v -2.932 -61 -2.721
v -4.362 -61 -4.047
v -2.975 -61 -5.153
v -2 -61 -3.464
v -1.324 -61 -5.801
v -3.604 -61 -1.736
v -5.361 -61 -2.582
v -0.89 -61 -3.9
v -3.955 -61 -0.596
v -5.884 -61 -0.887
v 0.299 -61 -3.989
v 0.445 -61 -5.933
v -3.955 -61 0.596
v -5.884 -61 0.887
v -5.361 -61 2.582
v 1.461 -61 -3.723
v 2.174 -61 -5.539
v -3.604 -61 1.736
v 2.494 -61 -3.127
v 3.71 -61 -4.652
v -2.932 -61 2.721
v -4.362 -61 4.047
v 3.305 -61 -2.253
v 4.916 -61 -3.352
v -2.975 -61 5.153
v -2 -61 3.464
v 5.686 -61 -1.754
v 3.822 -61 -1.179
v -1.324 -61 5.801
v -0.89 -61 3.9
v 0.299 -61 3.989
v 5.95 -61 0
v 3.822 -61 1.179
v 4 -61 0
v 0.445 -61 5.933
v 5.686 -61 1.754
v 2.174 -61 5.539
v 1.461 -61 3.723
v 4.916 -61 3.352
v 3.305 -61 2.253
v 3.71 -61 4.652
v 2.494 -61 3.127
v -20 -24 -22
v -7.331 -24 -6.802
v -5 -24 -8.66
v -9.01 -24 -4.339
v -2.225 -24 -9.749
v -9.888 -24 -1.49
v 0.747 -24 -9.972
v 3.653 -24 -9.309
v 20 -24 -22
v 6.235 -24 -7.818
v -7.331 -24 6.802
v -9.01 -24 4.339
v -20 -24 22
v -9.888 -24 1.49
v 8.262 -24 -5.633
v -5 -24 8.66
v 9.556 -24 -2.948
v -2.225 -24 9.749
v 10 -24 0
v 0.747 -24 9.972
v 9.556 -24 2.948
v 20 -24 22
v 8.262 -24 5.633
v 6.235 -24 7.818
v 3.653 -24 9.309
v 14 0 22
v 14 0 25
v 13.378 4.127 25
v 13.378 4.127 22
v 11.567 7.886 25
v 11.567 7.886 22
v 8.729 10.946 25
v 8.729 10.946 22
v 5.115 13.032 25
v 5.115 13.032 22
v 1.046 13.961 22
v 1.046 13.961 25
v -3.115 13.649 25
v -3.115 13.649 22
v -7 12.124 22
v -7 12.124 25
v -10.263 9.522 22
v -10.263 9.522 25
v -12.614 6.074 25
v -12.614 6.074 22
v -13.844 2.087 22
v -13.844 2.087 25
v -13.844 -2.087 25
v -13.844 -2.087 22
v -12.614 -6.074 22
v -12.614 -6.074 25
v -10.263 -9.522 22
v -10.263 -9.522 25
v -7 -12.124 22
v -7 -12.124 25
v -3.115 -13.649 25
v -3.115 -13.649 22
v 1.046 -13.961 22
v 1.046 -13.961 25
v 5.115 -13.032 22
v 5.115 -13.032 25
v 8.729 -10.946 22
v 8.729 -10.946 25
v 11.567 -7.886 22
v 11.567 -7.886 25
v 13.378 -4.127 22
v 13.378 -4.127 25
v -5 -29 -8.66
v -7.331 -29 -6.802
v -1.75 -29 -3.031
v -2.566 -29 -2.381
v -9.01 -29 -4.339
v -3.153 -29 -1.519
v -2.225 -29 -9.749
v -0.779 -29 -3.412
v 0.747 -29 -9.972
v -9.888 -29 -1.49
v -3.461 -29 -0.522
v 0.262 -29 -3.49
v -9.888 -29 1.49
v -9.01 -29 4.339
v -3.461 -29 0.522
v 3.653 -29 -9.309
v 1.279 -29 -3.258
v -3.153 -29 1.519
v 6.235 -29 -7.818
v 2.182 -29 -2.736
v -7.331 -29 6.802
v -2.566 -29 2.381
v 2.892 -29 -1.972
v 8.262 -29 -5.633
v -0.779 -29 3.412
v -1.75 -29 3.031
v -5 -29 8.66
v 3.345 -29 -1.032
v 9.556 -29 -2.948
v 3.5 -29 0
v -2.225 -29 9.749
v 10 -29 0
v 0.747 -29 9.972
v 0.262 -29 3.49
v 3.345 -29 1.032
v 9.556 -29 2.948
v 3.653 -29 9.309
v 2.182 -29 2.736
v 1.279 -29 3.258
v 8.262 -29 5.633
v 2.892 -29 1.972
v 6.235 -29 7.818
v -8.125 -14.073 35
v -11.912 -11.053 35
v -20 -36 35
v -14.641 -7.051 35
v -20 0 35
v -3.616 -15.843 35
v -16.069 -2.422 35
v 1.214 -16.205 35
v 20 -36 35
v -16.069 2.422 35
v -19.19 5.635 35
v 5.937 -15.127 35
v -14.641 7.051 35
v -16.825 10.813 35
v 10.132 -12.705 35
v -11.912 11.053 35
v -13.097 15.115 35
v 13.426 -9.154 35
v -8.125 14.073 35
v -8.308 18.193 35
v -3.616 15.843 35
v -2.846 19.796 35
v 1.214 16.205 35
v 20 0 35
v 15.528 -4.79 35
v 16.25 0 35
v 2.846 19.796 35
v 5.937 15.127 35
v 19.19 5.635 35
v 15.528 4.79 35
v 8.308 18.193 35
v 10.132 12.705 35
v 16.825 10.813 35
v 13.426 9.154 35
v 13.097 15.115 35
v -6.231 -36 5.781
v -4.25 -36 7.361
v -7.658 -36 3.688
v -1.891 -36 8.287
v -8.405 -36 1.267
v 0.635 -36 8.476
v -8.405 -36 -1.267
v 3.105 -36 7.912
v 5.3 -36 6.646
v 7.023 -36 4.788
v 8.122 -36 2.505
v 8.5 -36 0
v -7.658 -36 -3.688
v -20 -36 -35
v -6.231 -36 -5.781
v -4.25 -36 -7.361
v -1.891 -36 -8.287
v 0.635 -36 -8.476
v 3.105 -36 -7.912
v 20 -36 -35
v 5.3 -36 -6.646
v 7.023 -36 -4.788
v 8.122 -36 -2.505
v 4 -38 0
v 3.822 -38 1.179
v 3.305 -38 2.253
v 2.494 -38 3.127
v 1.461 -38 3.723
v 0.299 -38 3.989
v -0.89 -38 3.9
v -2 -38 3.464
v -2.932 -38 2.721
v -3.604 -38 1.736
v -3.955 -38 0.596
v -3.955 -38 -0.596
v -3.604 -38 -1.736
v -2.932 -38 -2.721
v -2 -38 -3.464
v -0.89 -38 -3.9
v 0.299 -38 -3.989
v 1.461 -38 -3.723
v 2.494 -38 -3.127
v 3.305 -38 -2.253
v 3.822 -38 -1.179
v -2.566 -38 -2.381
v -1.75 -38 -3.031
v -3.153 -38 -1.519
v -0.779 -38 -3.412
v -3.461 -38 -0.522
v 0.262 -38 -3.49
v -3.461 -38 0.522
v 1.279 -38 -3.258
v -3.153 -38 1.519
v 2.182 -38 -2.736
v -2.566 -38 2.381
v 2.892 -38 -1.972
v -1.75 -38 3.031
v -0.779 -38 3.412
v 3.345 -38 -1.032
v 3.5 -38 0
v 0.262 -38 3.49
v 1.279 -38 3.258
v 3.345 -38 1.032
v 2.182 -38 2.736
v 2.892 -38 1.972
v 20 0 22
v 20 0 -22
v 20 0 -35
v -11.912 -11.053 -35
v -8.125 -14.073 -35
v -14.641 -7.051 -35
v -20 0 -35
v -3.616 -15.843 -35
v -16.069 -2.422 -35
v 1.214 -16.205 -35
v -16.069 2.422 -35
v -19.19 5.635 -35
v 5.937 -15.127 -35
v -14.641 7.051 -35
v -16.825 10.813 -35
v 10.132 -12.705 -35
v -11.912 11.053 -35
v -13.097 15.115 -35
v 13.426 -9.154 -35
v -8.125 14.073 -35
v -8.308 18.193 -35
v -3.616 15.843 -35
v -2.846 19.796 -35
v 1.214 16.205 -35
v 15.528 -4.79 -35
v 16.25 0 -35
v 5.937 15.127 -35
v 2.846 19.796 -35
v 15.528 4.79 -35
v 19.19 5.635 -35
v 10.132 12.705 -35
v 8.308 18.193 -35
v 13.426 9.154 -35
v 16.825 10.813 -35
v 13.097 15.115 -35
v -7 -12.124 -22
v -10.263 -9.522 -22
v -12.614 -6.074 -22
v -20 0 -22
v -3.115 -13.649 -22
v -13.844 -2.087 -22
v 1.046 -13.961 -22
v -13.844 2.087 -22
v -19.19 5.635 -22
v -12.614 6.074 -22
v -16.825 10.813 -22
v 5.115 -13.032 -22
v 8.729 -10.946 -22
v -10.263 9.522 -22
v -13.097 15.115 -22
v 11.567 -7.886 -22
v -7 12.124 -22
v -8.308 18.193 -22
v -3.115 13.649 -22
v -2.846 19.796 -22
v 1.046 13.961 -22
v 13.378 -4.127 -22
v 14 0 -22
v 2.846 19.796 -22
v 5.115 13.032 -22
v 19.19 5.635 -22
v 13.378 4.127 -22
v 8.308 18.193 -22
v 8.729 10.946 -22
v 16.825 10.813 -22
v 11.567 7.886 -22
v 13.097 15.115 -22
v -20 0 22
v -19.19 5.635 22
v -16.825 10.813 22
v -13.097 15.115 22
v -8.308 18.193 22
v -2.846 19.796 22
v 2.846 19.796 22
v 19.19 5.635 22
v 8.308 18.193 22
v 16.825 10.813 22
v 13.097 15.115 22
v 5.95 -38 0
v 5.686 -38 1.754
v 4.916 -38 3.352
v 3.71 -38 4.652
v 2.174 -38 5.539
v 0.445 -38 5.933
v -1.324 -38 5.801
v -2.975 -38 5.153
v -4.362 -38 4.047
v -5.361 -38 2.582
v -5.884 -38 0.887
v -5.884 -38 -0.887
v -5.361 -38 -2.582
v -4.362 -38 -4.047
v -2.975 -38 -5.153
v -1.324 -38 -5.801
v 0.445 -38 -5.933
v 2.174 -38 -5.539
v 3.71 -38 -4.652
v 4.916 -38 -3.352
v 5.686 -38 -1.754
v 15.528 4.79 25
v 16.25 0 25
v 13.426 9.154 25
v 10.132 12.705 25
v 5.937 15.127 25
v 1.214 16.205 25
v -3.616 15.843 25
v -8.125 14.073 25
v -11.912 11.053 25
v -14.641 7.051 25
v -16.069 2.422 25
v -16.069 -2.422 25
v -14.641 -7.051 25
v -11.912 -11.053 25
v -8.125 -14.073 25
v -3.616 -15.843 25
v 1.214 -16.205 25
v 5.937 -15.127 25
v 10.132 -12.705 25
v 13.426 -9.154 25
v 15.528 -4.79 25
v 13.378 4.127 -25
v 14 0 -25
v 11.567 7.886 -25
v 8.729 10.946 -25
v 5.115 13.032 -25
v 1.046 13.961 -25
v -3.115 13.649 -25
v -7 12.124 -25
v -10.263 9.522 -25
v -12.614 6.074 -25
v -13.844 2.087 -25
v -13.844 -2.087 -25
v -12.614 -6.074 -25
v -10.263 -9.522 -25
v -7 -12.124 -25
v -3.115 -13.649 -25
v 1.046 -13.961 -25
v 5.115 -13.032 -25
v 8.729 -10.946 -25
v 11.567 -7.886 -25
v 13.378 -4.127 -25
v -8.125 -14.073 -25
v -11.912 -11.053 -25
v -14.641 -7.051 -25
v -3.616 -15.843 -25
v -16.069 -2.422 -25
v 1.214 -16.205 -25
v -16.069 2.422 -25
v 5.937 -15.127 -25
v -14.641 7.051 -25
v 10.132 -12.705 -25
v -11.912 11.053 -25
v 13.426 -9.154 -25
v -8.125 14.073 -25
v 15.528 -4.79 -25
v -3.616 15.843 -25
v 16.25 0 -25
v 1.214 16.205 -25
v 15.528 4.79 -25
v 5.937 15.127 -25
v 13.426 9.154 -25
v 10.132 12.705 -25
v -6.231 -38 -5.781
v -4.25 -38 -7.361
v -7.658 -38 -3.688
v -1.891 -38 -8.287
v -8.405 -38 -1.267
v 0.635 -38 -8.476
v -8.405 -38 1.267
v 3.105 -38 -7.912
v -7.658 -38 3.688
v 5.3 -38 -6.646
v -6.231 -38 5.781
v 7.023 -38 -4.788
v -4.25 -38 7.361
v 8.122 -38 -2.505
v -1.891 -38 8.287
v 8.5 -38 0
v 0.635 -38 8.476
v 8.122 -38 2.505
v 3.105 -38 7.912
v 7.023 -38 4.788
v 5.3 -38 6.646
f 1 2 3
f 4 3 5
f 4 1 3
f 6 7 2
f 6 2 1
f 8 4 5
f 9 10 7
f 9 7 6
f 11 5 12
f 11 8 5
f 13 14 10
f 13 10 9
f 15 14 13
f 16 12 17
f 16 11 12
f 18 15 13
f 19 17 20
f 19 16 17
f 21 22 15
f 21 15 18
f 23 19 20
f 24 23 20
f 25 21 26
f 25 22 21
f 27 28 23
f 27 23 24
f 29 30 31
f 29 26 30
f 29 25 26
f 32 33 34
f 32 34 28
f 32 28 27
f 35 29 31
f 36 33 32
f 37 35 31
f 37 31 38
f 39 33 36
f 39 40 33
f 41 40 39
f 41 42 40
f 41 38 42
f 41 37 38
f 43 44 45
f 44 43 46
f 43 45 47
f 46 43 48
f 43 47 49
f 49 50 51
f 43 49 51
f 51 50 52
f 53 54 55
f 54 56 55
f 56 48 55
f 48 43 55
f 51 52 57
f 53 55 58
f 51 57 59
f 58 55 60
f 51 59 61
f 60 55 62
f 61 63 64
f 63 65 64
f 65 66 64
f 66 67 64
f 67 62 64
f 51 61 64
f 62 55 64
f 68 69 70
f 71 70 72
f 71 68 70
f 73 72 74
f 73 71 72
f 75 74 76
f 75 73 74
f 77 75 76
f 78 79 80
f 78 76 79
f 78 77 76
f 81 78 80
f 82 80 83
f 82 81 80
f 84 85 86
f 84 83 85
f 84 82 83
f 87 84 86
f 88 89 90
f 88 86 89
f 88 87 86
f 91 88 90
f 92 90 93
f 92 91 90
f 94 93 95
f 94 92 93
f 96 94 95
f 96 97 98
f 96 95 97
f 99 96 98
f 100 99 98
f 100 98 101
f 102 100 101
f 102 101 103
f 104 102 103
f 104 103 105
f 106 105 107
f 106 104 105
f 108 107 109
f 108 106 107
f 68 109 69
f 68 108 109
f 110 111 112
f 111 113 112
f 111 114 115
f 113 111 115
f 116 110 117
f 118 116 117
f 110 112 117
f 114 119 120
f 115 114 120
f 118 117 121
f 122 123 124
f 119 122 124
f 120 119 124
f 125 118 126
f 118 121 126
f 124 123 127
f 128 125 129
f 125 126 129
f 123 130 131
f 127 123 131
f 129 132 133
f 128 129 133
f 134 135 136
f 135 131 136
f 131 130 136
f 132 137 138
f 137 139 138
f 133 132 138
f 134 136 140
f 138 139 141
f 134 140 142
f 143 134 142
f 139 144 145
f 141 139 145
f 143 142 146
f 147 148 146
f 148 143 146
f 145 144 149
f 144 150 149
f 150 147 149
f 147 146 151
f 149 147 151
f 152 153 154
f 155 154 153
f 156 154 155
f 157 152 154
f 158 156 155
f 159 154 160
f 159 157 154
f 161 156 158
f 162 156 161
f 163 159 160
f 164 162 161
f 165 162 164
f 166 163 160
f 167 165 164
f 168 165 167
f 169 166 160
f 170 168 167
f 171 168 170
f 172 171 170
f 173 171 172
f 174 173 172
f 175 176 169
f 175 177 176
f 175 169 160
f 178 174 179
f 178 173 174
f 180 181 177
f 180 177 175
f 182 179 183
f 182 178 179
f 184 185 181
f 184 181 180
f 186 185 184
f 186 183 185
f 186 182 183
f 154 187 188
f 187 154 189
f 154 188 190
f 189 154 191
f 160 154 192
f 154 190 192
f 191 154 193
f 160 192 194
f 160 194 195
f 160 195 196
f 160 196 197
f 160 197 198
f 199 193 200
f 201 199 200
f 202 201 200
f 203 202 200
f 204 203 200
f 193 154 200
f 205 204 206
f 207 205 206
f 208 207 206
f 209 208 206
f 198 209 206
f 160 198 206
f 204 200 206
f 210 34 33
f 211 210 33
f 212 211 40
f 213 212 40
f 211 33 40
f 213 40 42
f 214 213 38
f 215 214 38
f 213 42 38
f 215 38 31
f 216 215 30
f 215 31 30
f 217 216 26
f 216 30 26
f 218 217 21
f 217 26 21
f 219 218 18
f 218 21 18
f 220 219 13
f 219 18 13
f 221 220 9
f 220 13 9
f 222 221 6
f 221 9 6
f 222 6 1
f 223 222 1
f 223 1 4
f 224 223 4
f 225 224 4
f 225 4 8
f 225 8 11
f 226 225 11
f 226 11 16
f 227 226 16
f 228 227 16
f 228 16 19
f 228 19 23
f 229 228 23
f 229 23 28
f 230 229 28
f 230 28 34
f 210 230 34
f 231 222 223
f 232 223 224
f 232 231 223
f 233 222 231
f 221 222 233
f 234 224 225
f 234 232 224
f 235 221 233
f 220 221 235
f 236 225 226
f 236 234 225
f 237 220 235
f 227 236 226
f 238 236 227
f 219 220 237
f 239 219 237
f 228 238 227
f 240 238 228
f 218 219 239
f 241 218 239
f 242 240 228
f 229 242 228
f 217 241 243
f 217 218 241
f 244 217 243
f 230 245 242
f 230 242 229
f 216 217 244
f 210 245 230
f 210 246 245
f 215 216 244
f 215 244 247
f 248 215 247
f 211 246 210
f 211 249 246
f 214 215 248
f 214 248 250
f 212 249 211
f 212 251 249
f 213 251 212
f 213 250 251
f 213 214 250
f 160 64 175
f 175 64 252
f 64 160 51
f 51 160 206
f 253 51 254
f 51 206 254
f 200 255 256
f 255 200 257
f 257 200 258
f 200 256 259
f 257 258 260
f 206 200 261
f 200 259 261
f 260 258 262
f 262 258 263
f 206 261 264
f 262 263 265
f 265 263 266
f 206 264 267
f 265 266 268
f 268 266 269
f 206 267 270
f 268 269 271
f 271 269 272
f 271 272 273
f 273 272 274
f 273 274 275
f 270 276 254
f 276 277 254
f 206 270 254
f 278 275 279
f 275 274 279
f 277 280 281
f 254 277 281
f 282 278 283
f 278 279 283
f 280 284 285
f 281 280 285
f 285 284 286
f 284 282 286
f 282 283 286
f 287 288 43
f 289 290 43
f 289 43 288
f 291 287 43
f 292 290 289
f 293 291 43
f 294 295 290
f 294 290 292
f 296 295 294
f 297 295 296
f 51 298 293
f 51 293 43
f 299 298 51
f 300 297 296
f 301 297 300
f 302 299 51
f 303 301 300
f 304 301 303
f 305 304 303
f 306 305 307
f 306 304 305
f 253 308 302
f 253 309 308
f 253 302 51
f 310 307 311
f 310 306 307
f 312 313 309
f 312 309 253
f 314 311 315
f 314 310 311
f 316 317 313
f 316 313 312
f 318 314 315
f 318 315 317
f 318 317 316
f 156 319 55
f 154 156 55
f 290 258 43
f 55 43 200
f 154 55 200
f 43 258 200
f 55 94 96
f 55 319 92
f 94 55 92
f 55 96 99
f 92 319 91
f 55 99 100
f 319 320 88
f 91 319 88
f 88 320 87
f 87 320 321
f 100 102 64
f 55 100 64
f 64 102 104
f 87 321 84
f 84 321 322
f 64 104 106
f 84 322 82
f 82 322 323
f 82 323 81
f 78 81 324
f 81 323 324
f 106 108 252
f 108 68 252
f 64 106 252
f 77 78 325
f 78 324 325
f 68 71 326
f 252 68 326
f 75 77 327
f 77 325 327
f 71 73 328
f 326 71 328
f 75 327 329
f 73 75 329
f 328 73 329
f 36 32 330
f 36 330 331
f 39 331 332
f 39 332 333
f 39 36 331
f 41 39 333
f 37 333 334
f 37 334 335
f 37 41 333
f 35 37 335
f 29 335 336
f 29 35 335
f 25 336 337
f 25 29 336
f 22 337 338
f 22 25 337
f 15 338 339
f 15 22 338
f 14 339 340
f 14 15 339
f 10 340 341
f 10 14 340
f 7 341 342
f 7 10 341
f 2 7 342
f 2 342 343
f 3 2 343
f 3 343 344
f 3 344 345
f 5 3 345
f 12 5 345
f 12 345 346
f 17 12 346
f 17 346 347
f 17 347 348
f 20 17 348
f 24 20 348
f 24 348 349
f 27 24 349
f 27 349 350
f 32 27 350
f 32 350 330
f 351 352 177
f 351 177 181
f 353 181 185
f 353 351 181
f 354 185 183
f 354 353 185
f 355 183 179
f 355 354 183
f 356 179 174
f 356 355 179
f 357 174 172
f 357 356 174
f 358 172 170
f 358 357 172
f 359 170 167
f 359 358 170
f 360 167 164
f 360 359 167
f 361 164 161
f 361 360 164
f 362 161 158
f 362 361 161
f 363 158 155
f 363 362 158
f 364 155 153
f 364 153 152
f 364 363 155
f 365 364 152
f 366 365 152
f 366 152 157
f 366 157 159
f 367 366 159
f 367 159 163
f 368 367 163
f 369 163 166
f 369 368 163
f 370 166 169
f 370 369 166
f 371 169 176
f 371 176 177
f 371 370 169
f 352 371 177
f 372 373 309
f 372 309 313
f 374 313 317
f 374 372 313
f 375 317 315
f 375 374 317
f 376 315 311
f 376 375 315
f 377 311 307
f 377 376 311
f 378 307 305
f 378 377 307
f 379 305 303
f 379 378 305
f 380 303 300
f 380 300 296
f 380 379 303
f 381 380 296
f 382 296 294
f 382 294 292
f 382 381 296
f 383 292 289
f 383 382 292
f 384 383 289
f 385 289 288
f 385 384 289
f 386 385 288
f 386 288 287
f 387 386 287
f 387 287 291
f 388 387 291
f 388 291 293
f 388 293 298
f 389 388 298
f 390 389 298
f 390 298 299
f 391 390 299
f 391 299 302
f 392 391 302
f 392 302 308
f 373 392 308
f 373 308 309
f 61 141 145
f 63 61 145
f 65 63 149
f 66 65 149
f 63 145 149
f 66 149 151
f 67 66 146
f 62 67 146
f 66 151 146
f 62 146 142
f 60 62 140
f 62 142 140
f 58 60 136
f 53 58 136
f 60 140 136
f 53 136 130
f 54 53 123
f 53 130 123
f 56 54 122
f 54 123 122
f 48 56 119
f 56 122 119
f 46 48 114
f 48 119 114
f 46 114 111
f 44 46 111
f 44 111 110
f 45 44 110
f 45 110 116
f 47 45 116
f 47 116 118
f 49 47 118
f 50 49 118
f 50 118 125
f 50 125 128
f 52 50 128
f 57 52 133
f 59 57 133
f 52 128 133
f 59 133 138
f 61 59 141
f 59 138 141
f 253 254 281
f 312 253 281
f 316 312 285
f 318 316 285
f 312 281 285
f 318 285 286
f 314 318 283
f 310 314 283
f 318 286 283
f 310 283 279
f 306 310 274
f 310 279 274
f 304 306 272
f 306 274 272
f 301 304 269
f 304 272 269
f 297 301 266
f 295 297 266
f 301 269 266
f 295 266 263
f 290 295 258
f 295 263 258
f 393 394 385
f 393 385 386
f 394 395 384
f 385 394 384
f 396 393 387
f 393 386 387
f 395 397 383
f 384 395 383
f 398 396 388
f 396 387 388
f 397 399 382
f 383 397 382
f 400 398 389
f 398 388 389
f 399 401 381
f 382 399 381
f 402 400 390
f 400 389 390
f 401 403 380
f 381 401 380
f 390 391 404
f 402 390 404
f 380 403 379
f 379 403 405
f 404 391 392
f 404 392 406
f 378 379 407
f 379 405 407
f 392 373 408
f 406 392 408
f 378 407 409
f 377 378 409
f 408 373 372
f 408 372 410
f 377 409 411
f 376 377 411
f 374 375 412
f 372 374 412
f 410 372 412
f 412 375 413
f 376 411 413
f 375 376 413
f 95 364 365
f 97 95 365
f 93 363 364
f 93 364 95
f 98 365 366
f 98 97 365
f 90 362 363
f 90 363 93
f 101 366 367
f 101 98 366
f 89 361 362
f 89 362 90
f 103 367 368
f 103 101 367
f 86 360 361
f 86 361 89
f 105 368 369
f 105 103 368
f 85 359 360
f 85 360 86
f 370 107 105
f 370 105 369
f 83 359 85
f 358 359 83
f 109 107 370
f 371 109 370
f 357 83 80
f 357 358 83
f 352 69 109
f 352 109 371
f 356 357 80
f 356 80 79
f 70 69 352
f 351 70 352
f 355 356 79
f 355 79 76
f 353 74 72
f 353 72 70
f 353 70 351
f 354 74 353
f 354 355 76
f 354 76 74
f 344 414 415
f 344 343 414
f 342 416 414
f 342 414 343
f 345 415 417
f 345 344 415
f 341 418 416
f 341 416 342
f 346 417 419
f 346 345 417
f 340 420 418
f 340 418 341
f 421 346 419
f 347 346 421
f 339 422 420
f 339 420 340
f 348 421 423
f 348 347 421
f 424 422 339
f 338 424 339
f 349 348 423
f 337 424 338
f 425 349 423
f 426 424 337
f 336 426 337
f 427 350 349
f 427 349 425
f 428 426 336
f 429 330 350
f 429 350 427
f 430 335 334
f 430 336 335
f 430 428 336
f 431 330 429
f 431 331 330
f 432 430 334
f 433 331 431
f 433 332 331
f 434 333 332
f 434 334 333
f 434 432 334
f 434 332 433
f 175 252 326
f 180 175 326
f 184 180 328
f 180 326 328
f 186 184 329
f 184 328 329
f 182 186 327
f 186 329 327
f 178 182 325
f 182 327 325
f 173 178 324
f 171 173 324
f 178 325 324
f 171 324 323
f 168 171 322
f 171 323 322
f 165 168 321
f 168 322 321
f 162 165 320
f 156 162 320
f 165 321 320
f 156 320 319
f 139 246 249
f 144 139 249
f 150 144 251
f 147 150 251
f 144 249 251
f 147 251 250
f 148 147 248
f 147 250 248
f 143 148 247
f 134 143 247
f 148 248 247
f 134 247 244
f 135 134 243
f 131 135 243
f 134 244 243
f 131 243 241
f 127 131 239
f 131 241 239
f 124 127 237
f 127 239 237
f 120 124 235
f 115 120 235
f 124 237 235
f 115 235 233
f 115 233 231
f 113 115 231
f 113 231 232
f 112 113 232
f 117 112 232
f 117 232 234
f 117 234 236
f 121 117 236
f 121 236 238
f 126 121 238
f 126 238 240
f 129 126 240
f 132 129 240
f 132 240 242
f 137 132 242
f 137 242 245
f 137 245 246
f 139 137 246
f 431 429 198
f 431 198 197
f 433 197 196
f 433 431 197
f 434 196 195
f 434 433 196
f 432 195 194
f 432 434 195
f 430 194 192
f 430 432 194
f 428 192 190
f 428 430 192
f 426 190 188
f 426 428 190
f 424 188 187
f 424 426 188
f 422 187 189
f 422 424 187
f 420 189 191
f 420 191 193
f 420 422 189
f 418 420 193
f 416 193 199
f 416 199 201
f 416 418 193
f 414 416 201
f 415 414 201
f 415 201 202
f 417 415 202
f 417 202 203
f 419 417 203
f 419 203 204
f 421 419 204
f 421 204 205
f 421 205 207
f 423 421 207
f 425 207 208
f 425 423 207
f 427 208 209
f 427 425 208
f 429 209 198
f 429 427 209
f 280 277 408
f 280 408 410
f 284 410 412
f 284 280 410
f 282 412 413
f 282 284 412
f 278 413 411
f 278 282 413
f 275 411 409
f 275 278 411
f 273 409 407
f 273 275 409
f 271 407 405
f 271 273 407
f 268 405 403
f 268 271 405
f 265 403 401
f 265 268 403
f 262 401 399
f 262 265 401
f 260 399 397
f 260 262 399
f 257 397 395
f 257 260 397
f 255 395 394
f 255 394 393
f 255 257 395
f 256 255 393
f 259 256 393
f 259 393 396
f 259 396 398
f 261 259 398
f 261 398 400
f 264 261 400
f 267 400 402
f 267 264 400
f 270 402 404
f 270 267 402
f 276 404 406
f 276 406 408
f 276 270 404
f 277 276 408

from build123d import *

# Parameters (mm, degrees)
SKETCH005_AS_DRAWN_R                 = 10
EXTRUDE005_DEPTH                     = 5
EXTRUDE005_ONTO_SKETCH005_ROLL_ANGLE = 90
SKETCH001_AS_DRAWN_W                 = 40
SKETCH001_AS_DRAWN_H                 = 70
SKETCH001_AS_DRAWN_R                 = 3.5
EXTRUDE002_DEPTH                     = 12
EXTRUDE002_ONTO_SKETCH001_ROLL_ANGLE = 90
SKETCH004_AS_DRAWN_R                 = 8.5
SKETCH004_AS_DRAWN_R_2               = 3.5
EXTRUDE004_DEPTH                     = 2
EXTRUDE004_ONTO_SKETCH004_ROLL_ANGLE = 90
SKETCH003_AS_DRAWN_R                 = 5.95
SKETCH003_AS_DRAWN_R_2               = 4
EXTRUDE003_DEPTH                     = 25
EXTRUDE003_ONTO_SKETCH003_ROLL_ANGLE = 90
CYLINDER001_R                        = 16.25
CYLINDER001_DEPTH                    = 10
SKETCH_R                             = 14
EXTRUDE_DEPTH                        = 13
CYLINDER_R                           = 16.25
CYLINDER_DEPTH                       = 10
EXTRUDE001_DEPTH                     = 13


with BuildPart() as contra_nut_cut:
    # Sketch005 as drawn → Extrude005 (new)
    with BuildSketch(Plane.XY):
        Circle(SKETCH005_AS_DRAWN_R)
    extrude(amount=-EXTRUDE005_DEPTH)


with BuildPart() as contra_nut_cut_1:
    # Extrude005 onto Sketch005 roll: moved
    add(contra_nut_cut.part.rotate(Axis((0, 0, 0), (1, 0, 0)), EXTRUDE005_ONTO_SKETCH005_ROLL_ANGLE))


with BuildPart() as contra_nut_cut_2:
    # Extrude005 onto Sketch005 placement: moved
    add(contra_nut_cut_1.part)


with BuildPart() as contra_nut_cut_3:
    # Extrude005 placement: moved
    add(contra_nut_cut_2.part.moved(Location((0, 7, 0))))


with BuildPart() as nut_cut:
    # Sketch001 as drawn → Extrude002 (new)
    with BuildSketch(Plane.XY):
        Rectangle(SKETCH001_AS_DRAWN_W, SKETCH001_AS_DRAWN_H)
        Circle(SKETCH001_AS_DRAWN_R, mode=Mode.SUBTRACT)
    extrude(amount=-EXTRUDE002_DEPTH)


with BuildPart() as nut_cut_1:
    # Extrude002 onto Sketch001 roll: moved
    add(nut_cut.part.rotate(Axis((0, 0, 0), (1, 0, 0)), EXTRUDE002_ONTO_SKETCH001_ROLL_ANGLE))


with BuildPart() as nut_cut_2:
    # Extrude002 onto Sketch001 placement: moved
    add(nut_cut_1.part)

    # Cut002: cut contra-nut-cut
    add(contra_nut_cut_3.part, mode=Mode.SUBTRACT)


with BuildPart() as nut_cut_3:
    # Cut002 placement: moved
    add(nut_cut_2.part.moved(Location((0, -36, 0))))


with BuildPart() as z_bearings_pad:
    # Sketch004 as drawn → Extrude004 (new)
    with BuildSketch(Plane.XY):
        Circle(SKETCH004_AS_DRAWN_R)
        Circle(SKETCH004_AS_DRAWN_R_2, mode=Mode.SUBTRACT)
    extrude(amount=-EXTRUDE004_DEPTH)


with BuildPart() as z_bearings_pad_1:
    # Extrude004 onto Sketch004 roll: moved
    add(z_bearings_pad.part.rotate(Axis((0, 0, 0), (1, 0, 0)), EXTRUDE004_ONTO_SKETCH004_ROLL_ANGLE))


with BuildPart() as z_bearings_pad_2:
    # Extrude004 onto Sketch004 placement: moved
    add(z_bearings_pad_1.part)


with BuildPart() as z_bearings_pad_3:
    # Extrude004 placement: moved
    add(z_bearings_pad_2.part.moved(Location((0, -38, 0))))


with BuildPart() as z_bearings_cylinder:
    # Sketch003 as drawn → Extrude003 (new)
    with BuildSketch(Plane.XY):
        Circle(SKETCH003_AS_DRAWN_R)
        Circle(SKETCH003_AS_DRAWN_R_2, mode=Mode.SUBTRACT)
    extrude(amount=-EXTRUDE003_DEPTH)


with BuildPart() as z_bearings_cylinder_1:
    # Extrude003 onto Sketch003 roll: moved
    add(z_bearings_cylinder.part.rotate(Axis((0, 0, 0), (1, 0, 0)), EXTRUDE003_ONTO_SKETCH003_ROLL_ANGLE))


with BuildPart() as z_bearings_cylinder_2:
    # Extrude003 onto Sketch003 placement: moved
    add(z_bearings_cylinder_1.part)


with BuildPart() as z_bearings_cylinder_3:
    # Extrude003 placement: moved
    add(z_bearings_cylinder_2.part.moved(Location((0, -61, 0))))


with BuildPart() as cylinder001:
    # Cylinder001 → Cylinder001 (new body)
    with BuildSketch(Plane.XY.offset(3)):
        Circle(CYLINDER001_R)
    extrude(amount=CYLINDER001_DEPTH)


with BuildPart() as bearing_nest_r_cut:
    # Sketch → Extrude (new body)
    with BuildSketch(Plane.XY):
        with BuildLine():
            ThreePointArc((20, 0), (0, 20), (-20, 0))
            Line((-20, 0), (-20, -36))
            Line((-20, -36), (20, -36))
            Line((20, -36), (20, 0))
        make_face()
        Circle(SKETCH_R, mode=Mode.SUBTRACT)
    extrude(amount=EXTRUDE_DEPTH)

    # Cut001: cut Cylinder001
    add(cylinder001.part, mode=Mode.SUBTRACT)


with BuildPart() as bearing_nest_r_cut_1:
    # Cut001 placement: moved
    add(bearing_nest_r_cut.part.moved(Location((0, 0, 22))))


with BuildPart() as cylinder:
    # Cylinder → Cylinder (new body)
    with BuildSketch(Plane.XY):
        Circle(CYLINDER_R)
    extrude(amount=CYLINDER_DEPTH)


with BuildPart() as fusion:
    # Sketch → Extrude001 (new body)
    with BuildSketch(Plane.XY):
        with BuildLine():
            ThreePointArc((20, 0), (0, 20), (-20, 0))
            Line((-20, 0), (-20, -36))
            Line((-20, -36), (20, -36))
            Line((20, -36), (20, 0))
        make_face()
        Circle(SKETCH_R, mode=Mode.SUBTRACT)
    extrude(amount=EXTRUDE001_DEPTH)

    # Cut: cut Cylinder
    add(cylinder.part, mode=Mode.SUBTRACT)


with BuildPart() as fusion_1:
    # Cut placement: moved
    add(fusion.part.moved(Location((0, 0, -35))))

    # Fusion: union nut-cut, z-bearings-pad, z-bearings-cylinder, bearing-nest-r-cut
    add(nut_cut_3.part)
    add(z_bearings_pad_3.part)
    add(z_bearings_cylinder_3.part)
    add(bearing_nest_r_cut_1.part)


solid = fusion_1.part
